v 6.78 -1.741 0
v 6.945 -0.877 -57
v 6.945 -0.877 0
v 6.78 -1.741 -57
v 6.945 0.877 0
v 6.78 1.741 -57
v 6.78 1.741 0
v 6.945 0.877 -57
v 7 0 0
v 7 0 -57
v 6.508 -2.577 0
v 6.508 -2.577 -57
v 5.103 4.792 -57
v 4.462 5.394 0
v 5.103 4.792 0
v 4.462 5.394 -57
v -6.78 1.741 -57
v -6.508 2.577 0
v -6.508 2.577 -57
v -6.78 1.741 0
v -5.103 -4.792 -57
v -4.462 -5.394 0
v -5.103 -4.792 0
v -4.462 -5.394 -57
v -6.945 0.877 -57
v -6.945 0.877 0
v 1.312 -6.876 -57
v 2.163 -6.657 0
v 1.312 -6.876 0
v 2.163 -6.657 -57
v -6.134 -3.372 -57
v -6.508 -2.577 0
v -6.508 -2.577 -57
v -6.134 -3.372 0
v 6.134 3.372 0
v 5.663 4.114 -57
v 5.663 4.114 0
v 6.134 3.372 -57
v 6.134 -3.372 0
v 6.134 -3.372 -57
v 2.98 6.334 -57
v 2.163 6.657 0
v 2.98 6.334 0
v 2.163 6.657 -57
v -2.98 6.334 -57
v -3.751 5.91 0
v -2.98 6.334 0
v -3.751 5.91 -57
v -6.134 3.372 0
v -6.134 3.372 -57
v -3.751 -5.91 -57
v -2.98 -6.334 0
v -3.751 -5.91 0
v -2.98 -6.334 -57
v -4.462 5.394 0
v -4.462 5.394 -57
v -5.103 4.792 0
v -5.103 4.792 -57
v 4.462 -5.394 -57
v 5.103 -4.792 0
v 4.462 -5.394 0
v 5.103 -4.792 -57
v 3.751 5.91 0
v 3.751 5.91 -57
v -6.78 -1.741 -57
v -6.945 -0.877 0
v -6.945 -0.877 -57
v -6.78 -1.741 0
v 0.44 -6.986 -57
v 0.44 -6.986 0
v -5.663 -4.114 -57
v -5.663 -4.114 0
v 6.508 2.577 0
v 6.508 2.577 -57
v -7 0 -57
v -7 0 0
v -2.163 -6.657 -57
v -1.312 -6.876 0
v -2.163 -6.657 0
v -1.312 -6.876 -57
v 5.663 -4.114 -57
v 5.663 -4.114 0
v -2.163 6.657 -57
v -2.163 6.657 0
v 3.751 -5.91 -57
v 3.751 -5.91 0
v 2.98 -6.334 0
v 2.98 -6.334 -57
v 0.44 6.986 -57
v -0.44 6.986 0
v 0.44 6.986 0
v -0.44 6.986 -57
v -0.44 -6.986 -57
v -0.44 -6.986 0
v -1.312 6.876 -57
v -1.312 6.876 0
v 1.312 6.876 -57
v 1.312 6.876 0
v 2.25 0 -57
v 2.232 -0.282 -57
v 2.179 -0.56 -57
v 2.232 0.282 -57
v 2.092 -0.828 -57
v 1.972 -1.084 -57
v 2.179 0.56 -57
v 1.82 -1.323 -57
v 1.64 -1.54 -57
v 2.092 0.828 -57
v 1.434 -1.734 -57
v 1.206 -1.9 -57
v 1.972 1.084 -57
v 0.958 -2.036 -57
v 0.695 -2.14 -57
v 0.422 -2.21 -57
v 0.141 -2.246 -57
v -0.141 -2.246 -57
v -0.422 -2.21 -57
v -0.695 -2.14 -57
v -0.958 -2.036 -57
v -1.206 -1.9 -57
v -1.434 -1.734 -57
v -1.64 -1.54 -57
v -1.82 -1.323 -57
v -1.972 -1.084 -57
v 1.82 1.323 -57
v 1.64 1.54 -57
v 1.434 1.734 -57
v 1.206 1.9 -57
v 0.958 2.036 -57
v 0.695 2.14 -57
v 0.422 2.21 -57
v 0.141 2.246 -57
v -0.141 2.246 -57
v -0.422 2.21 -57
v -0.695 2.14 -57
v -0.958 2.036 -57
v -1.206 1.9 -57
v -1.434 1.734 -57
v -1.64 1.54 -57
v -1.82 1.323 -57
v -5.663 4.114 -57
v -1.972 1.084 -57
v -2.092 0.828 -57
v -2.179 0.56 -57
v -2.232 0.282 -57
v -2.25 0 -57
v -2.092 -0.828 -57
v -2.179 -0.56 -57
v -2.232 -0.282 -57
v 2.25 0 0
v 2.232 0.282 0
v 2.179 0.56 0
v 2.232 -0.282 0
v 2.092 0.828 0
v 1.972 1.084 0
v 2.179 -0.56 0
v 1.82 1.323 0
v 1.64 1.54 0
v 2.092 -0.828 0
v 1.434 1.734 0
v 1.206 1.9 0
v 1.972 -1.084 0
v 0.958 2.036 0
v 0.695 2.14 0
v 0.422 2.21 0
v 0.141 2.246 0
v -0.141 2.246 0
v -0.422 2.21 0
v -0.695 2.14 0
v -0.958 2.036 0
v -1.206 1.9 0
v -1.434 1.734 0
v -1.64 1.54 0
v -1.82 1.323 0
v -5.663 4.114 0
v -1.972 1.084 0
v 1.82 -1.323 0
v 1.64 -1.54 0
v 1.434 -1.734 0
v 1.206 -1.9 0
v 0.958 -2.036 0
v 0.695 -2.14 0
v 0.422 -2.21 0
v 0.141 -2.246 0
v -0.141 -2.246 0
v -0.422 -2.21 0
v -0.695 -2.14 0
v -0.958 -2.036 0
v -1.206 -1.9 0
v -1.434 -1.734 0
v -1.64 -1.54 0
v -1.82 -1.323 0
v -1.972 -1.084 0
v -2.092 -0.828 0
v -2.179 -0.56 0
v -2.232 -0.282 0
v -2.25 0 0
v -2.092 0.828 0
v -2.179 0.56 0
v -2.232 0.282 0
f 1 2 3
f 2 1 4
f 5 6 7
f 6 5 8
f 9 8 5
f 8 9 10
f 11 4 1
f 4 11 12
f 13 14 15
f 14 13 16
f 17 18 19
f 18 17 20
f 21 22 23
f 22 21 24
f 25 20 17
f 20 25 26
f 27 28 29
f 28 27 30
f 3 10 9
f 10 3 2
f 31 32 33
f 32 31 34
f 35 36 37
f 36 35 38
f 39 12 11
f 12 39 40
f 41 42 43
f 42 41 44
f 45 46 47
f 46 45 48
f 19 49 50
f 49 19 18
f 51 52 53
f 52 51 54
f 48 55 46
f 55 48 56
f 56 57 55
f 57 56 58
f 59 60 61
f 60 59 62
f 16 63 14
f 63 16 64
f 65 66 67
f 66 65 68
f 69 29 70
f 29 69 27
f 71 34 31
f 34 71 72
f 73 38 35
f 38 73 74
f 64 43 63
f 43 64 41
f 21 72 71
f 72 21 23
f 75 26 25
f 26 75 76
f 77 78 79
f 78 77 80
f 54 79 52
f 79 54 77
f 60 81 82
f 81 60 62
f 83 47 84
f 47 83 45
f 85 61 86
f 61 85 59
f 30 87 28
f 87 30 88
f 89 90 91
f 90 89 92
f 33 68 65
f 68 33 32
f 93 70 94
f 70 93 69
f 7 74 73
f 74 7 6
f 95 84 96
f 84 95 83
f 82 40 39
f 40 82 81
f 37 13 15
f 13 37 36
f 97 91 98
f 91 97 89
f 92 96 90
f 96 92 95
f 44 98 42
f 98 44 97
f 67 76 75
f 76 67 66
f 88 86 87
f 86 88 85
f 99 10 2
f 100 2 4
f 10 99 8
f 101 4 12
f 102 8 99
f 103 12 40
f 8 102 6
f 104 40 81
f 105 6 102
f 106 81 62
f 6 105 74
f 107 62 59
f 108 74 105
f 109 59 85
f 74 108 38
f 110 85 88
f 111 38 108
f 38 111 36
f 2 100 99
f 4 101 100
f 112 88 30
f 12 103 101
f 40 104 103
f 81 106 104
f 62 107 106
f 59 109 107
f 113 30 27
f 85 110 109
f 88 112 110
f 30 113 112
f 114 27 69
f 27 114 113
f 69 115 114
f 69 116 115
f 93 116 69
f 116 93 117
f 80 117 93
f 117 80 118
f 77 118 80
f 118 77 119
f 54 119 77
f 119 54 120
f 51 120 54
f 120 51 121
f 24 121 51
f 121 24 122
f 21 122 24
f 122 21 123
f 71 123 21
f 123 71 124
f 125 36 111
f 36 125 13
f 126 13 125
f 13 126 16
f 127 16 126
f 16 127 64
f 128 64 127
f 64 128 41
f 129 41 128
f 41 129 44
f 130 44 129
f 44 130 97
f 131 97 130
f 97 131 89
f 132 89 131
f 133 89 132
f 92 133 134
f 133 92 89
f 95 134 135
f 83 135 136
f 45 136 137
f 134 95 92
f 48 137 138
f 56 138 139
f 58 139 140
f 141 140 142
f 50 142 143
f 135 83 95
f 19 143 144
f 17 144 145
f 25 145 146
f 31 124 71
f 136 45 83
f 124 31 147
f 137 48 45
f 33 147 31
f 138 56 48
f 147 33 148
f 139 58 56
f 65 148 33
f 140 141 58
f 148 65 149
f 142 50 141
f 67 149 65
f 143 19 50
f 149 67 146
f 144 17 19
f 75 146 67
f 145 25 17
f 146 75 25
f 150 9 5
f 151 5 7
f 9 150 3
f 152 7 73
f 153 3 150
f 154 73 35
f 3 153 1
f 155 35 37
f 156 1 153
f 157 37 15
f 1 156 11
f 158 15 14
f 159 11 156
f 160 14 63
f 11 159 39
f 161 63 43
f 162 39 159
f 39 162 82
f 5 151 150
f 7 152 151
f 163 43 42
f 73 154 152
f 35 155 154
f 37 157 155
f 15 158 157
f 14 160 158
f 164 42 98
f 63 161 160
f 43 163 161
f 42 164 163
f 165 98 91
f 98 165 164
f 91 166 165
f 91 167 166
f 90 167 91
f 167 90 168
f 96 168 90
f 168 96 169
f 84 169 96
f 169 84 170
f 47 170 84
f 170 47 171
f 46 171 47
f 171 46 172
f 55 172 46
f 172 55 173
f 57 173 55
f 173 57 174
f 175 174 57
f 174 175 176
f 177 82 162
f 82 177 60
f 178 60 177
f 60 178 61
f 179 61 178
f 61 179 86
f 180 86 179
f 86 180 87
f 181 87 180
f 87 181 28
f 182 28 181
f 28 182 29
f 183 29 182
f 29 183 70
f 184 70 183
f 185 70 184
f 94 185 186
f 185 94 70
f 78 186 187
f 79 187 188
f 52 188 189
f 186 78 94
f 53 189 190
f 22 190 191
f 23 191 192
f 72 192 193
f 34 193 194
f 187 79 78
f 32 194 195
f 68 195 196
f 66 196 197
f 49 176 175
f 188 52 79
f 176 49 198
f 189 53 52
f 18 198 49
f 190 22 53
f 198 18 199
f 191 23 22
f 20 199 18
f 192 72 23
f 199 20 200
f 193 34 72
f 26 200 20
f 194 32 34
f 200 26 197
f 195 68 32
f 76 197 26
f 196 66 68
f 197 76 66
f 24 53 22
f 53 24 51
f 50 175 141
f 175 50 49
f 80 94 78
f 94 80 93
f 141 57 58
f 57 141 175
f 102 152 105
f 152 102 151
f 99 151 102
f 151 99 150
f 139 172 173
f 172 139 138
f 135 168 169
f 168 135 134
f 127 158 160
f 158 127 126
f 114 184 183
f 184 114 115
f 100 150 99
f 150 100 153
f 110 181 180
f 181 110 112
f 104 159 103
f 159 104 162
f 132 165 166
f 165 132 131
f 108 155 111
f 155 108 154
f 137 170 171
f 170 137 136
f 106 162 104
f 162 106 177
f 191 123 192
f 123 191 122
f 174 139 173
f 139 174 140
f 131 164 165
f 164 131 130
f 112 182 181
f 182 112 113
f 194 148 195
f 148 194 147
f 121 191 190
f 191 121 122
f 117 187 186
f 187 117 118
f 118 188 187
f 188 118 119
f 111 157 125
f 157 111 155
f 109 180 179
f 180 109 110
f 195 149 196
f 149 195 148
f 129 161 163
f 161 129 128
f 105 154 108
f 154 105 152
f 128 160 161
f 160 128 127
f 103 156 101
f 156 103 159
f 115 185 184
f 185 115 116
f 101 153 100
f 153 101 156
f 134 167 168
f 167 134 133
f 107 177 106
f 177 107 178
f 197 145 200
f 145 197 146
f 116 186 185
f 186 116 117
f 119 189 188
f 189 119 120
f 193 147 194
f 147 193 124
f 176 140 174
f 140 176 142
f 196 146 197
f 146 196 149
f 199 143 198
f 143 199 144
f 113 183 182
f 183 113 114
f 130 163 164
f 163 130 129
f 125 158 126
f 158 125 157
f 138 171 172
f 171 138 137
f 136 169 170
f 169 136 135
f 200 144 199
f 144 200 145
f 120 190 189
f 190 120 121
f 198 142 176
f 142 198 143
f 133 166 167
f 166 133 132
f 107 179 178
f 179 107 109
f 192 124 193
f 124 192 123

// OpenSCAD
$fn = 50;


difference() {
	union() {
		translate(v = [0, 0, -57.0000000000]) {
			cylinder(h = 57, r = 7.0000000000);
		}
	}
	union() {
		#translate(v = [0, 0, -57]) {
			cylinder(h = 57, r = 2.2500000000);
		}
	}
}
